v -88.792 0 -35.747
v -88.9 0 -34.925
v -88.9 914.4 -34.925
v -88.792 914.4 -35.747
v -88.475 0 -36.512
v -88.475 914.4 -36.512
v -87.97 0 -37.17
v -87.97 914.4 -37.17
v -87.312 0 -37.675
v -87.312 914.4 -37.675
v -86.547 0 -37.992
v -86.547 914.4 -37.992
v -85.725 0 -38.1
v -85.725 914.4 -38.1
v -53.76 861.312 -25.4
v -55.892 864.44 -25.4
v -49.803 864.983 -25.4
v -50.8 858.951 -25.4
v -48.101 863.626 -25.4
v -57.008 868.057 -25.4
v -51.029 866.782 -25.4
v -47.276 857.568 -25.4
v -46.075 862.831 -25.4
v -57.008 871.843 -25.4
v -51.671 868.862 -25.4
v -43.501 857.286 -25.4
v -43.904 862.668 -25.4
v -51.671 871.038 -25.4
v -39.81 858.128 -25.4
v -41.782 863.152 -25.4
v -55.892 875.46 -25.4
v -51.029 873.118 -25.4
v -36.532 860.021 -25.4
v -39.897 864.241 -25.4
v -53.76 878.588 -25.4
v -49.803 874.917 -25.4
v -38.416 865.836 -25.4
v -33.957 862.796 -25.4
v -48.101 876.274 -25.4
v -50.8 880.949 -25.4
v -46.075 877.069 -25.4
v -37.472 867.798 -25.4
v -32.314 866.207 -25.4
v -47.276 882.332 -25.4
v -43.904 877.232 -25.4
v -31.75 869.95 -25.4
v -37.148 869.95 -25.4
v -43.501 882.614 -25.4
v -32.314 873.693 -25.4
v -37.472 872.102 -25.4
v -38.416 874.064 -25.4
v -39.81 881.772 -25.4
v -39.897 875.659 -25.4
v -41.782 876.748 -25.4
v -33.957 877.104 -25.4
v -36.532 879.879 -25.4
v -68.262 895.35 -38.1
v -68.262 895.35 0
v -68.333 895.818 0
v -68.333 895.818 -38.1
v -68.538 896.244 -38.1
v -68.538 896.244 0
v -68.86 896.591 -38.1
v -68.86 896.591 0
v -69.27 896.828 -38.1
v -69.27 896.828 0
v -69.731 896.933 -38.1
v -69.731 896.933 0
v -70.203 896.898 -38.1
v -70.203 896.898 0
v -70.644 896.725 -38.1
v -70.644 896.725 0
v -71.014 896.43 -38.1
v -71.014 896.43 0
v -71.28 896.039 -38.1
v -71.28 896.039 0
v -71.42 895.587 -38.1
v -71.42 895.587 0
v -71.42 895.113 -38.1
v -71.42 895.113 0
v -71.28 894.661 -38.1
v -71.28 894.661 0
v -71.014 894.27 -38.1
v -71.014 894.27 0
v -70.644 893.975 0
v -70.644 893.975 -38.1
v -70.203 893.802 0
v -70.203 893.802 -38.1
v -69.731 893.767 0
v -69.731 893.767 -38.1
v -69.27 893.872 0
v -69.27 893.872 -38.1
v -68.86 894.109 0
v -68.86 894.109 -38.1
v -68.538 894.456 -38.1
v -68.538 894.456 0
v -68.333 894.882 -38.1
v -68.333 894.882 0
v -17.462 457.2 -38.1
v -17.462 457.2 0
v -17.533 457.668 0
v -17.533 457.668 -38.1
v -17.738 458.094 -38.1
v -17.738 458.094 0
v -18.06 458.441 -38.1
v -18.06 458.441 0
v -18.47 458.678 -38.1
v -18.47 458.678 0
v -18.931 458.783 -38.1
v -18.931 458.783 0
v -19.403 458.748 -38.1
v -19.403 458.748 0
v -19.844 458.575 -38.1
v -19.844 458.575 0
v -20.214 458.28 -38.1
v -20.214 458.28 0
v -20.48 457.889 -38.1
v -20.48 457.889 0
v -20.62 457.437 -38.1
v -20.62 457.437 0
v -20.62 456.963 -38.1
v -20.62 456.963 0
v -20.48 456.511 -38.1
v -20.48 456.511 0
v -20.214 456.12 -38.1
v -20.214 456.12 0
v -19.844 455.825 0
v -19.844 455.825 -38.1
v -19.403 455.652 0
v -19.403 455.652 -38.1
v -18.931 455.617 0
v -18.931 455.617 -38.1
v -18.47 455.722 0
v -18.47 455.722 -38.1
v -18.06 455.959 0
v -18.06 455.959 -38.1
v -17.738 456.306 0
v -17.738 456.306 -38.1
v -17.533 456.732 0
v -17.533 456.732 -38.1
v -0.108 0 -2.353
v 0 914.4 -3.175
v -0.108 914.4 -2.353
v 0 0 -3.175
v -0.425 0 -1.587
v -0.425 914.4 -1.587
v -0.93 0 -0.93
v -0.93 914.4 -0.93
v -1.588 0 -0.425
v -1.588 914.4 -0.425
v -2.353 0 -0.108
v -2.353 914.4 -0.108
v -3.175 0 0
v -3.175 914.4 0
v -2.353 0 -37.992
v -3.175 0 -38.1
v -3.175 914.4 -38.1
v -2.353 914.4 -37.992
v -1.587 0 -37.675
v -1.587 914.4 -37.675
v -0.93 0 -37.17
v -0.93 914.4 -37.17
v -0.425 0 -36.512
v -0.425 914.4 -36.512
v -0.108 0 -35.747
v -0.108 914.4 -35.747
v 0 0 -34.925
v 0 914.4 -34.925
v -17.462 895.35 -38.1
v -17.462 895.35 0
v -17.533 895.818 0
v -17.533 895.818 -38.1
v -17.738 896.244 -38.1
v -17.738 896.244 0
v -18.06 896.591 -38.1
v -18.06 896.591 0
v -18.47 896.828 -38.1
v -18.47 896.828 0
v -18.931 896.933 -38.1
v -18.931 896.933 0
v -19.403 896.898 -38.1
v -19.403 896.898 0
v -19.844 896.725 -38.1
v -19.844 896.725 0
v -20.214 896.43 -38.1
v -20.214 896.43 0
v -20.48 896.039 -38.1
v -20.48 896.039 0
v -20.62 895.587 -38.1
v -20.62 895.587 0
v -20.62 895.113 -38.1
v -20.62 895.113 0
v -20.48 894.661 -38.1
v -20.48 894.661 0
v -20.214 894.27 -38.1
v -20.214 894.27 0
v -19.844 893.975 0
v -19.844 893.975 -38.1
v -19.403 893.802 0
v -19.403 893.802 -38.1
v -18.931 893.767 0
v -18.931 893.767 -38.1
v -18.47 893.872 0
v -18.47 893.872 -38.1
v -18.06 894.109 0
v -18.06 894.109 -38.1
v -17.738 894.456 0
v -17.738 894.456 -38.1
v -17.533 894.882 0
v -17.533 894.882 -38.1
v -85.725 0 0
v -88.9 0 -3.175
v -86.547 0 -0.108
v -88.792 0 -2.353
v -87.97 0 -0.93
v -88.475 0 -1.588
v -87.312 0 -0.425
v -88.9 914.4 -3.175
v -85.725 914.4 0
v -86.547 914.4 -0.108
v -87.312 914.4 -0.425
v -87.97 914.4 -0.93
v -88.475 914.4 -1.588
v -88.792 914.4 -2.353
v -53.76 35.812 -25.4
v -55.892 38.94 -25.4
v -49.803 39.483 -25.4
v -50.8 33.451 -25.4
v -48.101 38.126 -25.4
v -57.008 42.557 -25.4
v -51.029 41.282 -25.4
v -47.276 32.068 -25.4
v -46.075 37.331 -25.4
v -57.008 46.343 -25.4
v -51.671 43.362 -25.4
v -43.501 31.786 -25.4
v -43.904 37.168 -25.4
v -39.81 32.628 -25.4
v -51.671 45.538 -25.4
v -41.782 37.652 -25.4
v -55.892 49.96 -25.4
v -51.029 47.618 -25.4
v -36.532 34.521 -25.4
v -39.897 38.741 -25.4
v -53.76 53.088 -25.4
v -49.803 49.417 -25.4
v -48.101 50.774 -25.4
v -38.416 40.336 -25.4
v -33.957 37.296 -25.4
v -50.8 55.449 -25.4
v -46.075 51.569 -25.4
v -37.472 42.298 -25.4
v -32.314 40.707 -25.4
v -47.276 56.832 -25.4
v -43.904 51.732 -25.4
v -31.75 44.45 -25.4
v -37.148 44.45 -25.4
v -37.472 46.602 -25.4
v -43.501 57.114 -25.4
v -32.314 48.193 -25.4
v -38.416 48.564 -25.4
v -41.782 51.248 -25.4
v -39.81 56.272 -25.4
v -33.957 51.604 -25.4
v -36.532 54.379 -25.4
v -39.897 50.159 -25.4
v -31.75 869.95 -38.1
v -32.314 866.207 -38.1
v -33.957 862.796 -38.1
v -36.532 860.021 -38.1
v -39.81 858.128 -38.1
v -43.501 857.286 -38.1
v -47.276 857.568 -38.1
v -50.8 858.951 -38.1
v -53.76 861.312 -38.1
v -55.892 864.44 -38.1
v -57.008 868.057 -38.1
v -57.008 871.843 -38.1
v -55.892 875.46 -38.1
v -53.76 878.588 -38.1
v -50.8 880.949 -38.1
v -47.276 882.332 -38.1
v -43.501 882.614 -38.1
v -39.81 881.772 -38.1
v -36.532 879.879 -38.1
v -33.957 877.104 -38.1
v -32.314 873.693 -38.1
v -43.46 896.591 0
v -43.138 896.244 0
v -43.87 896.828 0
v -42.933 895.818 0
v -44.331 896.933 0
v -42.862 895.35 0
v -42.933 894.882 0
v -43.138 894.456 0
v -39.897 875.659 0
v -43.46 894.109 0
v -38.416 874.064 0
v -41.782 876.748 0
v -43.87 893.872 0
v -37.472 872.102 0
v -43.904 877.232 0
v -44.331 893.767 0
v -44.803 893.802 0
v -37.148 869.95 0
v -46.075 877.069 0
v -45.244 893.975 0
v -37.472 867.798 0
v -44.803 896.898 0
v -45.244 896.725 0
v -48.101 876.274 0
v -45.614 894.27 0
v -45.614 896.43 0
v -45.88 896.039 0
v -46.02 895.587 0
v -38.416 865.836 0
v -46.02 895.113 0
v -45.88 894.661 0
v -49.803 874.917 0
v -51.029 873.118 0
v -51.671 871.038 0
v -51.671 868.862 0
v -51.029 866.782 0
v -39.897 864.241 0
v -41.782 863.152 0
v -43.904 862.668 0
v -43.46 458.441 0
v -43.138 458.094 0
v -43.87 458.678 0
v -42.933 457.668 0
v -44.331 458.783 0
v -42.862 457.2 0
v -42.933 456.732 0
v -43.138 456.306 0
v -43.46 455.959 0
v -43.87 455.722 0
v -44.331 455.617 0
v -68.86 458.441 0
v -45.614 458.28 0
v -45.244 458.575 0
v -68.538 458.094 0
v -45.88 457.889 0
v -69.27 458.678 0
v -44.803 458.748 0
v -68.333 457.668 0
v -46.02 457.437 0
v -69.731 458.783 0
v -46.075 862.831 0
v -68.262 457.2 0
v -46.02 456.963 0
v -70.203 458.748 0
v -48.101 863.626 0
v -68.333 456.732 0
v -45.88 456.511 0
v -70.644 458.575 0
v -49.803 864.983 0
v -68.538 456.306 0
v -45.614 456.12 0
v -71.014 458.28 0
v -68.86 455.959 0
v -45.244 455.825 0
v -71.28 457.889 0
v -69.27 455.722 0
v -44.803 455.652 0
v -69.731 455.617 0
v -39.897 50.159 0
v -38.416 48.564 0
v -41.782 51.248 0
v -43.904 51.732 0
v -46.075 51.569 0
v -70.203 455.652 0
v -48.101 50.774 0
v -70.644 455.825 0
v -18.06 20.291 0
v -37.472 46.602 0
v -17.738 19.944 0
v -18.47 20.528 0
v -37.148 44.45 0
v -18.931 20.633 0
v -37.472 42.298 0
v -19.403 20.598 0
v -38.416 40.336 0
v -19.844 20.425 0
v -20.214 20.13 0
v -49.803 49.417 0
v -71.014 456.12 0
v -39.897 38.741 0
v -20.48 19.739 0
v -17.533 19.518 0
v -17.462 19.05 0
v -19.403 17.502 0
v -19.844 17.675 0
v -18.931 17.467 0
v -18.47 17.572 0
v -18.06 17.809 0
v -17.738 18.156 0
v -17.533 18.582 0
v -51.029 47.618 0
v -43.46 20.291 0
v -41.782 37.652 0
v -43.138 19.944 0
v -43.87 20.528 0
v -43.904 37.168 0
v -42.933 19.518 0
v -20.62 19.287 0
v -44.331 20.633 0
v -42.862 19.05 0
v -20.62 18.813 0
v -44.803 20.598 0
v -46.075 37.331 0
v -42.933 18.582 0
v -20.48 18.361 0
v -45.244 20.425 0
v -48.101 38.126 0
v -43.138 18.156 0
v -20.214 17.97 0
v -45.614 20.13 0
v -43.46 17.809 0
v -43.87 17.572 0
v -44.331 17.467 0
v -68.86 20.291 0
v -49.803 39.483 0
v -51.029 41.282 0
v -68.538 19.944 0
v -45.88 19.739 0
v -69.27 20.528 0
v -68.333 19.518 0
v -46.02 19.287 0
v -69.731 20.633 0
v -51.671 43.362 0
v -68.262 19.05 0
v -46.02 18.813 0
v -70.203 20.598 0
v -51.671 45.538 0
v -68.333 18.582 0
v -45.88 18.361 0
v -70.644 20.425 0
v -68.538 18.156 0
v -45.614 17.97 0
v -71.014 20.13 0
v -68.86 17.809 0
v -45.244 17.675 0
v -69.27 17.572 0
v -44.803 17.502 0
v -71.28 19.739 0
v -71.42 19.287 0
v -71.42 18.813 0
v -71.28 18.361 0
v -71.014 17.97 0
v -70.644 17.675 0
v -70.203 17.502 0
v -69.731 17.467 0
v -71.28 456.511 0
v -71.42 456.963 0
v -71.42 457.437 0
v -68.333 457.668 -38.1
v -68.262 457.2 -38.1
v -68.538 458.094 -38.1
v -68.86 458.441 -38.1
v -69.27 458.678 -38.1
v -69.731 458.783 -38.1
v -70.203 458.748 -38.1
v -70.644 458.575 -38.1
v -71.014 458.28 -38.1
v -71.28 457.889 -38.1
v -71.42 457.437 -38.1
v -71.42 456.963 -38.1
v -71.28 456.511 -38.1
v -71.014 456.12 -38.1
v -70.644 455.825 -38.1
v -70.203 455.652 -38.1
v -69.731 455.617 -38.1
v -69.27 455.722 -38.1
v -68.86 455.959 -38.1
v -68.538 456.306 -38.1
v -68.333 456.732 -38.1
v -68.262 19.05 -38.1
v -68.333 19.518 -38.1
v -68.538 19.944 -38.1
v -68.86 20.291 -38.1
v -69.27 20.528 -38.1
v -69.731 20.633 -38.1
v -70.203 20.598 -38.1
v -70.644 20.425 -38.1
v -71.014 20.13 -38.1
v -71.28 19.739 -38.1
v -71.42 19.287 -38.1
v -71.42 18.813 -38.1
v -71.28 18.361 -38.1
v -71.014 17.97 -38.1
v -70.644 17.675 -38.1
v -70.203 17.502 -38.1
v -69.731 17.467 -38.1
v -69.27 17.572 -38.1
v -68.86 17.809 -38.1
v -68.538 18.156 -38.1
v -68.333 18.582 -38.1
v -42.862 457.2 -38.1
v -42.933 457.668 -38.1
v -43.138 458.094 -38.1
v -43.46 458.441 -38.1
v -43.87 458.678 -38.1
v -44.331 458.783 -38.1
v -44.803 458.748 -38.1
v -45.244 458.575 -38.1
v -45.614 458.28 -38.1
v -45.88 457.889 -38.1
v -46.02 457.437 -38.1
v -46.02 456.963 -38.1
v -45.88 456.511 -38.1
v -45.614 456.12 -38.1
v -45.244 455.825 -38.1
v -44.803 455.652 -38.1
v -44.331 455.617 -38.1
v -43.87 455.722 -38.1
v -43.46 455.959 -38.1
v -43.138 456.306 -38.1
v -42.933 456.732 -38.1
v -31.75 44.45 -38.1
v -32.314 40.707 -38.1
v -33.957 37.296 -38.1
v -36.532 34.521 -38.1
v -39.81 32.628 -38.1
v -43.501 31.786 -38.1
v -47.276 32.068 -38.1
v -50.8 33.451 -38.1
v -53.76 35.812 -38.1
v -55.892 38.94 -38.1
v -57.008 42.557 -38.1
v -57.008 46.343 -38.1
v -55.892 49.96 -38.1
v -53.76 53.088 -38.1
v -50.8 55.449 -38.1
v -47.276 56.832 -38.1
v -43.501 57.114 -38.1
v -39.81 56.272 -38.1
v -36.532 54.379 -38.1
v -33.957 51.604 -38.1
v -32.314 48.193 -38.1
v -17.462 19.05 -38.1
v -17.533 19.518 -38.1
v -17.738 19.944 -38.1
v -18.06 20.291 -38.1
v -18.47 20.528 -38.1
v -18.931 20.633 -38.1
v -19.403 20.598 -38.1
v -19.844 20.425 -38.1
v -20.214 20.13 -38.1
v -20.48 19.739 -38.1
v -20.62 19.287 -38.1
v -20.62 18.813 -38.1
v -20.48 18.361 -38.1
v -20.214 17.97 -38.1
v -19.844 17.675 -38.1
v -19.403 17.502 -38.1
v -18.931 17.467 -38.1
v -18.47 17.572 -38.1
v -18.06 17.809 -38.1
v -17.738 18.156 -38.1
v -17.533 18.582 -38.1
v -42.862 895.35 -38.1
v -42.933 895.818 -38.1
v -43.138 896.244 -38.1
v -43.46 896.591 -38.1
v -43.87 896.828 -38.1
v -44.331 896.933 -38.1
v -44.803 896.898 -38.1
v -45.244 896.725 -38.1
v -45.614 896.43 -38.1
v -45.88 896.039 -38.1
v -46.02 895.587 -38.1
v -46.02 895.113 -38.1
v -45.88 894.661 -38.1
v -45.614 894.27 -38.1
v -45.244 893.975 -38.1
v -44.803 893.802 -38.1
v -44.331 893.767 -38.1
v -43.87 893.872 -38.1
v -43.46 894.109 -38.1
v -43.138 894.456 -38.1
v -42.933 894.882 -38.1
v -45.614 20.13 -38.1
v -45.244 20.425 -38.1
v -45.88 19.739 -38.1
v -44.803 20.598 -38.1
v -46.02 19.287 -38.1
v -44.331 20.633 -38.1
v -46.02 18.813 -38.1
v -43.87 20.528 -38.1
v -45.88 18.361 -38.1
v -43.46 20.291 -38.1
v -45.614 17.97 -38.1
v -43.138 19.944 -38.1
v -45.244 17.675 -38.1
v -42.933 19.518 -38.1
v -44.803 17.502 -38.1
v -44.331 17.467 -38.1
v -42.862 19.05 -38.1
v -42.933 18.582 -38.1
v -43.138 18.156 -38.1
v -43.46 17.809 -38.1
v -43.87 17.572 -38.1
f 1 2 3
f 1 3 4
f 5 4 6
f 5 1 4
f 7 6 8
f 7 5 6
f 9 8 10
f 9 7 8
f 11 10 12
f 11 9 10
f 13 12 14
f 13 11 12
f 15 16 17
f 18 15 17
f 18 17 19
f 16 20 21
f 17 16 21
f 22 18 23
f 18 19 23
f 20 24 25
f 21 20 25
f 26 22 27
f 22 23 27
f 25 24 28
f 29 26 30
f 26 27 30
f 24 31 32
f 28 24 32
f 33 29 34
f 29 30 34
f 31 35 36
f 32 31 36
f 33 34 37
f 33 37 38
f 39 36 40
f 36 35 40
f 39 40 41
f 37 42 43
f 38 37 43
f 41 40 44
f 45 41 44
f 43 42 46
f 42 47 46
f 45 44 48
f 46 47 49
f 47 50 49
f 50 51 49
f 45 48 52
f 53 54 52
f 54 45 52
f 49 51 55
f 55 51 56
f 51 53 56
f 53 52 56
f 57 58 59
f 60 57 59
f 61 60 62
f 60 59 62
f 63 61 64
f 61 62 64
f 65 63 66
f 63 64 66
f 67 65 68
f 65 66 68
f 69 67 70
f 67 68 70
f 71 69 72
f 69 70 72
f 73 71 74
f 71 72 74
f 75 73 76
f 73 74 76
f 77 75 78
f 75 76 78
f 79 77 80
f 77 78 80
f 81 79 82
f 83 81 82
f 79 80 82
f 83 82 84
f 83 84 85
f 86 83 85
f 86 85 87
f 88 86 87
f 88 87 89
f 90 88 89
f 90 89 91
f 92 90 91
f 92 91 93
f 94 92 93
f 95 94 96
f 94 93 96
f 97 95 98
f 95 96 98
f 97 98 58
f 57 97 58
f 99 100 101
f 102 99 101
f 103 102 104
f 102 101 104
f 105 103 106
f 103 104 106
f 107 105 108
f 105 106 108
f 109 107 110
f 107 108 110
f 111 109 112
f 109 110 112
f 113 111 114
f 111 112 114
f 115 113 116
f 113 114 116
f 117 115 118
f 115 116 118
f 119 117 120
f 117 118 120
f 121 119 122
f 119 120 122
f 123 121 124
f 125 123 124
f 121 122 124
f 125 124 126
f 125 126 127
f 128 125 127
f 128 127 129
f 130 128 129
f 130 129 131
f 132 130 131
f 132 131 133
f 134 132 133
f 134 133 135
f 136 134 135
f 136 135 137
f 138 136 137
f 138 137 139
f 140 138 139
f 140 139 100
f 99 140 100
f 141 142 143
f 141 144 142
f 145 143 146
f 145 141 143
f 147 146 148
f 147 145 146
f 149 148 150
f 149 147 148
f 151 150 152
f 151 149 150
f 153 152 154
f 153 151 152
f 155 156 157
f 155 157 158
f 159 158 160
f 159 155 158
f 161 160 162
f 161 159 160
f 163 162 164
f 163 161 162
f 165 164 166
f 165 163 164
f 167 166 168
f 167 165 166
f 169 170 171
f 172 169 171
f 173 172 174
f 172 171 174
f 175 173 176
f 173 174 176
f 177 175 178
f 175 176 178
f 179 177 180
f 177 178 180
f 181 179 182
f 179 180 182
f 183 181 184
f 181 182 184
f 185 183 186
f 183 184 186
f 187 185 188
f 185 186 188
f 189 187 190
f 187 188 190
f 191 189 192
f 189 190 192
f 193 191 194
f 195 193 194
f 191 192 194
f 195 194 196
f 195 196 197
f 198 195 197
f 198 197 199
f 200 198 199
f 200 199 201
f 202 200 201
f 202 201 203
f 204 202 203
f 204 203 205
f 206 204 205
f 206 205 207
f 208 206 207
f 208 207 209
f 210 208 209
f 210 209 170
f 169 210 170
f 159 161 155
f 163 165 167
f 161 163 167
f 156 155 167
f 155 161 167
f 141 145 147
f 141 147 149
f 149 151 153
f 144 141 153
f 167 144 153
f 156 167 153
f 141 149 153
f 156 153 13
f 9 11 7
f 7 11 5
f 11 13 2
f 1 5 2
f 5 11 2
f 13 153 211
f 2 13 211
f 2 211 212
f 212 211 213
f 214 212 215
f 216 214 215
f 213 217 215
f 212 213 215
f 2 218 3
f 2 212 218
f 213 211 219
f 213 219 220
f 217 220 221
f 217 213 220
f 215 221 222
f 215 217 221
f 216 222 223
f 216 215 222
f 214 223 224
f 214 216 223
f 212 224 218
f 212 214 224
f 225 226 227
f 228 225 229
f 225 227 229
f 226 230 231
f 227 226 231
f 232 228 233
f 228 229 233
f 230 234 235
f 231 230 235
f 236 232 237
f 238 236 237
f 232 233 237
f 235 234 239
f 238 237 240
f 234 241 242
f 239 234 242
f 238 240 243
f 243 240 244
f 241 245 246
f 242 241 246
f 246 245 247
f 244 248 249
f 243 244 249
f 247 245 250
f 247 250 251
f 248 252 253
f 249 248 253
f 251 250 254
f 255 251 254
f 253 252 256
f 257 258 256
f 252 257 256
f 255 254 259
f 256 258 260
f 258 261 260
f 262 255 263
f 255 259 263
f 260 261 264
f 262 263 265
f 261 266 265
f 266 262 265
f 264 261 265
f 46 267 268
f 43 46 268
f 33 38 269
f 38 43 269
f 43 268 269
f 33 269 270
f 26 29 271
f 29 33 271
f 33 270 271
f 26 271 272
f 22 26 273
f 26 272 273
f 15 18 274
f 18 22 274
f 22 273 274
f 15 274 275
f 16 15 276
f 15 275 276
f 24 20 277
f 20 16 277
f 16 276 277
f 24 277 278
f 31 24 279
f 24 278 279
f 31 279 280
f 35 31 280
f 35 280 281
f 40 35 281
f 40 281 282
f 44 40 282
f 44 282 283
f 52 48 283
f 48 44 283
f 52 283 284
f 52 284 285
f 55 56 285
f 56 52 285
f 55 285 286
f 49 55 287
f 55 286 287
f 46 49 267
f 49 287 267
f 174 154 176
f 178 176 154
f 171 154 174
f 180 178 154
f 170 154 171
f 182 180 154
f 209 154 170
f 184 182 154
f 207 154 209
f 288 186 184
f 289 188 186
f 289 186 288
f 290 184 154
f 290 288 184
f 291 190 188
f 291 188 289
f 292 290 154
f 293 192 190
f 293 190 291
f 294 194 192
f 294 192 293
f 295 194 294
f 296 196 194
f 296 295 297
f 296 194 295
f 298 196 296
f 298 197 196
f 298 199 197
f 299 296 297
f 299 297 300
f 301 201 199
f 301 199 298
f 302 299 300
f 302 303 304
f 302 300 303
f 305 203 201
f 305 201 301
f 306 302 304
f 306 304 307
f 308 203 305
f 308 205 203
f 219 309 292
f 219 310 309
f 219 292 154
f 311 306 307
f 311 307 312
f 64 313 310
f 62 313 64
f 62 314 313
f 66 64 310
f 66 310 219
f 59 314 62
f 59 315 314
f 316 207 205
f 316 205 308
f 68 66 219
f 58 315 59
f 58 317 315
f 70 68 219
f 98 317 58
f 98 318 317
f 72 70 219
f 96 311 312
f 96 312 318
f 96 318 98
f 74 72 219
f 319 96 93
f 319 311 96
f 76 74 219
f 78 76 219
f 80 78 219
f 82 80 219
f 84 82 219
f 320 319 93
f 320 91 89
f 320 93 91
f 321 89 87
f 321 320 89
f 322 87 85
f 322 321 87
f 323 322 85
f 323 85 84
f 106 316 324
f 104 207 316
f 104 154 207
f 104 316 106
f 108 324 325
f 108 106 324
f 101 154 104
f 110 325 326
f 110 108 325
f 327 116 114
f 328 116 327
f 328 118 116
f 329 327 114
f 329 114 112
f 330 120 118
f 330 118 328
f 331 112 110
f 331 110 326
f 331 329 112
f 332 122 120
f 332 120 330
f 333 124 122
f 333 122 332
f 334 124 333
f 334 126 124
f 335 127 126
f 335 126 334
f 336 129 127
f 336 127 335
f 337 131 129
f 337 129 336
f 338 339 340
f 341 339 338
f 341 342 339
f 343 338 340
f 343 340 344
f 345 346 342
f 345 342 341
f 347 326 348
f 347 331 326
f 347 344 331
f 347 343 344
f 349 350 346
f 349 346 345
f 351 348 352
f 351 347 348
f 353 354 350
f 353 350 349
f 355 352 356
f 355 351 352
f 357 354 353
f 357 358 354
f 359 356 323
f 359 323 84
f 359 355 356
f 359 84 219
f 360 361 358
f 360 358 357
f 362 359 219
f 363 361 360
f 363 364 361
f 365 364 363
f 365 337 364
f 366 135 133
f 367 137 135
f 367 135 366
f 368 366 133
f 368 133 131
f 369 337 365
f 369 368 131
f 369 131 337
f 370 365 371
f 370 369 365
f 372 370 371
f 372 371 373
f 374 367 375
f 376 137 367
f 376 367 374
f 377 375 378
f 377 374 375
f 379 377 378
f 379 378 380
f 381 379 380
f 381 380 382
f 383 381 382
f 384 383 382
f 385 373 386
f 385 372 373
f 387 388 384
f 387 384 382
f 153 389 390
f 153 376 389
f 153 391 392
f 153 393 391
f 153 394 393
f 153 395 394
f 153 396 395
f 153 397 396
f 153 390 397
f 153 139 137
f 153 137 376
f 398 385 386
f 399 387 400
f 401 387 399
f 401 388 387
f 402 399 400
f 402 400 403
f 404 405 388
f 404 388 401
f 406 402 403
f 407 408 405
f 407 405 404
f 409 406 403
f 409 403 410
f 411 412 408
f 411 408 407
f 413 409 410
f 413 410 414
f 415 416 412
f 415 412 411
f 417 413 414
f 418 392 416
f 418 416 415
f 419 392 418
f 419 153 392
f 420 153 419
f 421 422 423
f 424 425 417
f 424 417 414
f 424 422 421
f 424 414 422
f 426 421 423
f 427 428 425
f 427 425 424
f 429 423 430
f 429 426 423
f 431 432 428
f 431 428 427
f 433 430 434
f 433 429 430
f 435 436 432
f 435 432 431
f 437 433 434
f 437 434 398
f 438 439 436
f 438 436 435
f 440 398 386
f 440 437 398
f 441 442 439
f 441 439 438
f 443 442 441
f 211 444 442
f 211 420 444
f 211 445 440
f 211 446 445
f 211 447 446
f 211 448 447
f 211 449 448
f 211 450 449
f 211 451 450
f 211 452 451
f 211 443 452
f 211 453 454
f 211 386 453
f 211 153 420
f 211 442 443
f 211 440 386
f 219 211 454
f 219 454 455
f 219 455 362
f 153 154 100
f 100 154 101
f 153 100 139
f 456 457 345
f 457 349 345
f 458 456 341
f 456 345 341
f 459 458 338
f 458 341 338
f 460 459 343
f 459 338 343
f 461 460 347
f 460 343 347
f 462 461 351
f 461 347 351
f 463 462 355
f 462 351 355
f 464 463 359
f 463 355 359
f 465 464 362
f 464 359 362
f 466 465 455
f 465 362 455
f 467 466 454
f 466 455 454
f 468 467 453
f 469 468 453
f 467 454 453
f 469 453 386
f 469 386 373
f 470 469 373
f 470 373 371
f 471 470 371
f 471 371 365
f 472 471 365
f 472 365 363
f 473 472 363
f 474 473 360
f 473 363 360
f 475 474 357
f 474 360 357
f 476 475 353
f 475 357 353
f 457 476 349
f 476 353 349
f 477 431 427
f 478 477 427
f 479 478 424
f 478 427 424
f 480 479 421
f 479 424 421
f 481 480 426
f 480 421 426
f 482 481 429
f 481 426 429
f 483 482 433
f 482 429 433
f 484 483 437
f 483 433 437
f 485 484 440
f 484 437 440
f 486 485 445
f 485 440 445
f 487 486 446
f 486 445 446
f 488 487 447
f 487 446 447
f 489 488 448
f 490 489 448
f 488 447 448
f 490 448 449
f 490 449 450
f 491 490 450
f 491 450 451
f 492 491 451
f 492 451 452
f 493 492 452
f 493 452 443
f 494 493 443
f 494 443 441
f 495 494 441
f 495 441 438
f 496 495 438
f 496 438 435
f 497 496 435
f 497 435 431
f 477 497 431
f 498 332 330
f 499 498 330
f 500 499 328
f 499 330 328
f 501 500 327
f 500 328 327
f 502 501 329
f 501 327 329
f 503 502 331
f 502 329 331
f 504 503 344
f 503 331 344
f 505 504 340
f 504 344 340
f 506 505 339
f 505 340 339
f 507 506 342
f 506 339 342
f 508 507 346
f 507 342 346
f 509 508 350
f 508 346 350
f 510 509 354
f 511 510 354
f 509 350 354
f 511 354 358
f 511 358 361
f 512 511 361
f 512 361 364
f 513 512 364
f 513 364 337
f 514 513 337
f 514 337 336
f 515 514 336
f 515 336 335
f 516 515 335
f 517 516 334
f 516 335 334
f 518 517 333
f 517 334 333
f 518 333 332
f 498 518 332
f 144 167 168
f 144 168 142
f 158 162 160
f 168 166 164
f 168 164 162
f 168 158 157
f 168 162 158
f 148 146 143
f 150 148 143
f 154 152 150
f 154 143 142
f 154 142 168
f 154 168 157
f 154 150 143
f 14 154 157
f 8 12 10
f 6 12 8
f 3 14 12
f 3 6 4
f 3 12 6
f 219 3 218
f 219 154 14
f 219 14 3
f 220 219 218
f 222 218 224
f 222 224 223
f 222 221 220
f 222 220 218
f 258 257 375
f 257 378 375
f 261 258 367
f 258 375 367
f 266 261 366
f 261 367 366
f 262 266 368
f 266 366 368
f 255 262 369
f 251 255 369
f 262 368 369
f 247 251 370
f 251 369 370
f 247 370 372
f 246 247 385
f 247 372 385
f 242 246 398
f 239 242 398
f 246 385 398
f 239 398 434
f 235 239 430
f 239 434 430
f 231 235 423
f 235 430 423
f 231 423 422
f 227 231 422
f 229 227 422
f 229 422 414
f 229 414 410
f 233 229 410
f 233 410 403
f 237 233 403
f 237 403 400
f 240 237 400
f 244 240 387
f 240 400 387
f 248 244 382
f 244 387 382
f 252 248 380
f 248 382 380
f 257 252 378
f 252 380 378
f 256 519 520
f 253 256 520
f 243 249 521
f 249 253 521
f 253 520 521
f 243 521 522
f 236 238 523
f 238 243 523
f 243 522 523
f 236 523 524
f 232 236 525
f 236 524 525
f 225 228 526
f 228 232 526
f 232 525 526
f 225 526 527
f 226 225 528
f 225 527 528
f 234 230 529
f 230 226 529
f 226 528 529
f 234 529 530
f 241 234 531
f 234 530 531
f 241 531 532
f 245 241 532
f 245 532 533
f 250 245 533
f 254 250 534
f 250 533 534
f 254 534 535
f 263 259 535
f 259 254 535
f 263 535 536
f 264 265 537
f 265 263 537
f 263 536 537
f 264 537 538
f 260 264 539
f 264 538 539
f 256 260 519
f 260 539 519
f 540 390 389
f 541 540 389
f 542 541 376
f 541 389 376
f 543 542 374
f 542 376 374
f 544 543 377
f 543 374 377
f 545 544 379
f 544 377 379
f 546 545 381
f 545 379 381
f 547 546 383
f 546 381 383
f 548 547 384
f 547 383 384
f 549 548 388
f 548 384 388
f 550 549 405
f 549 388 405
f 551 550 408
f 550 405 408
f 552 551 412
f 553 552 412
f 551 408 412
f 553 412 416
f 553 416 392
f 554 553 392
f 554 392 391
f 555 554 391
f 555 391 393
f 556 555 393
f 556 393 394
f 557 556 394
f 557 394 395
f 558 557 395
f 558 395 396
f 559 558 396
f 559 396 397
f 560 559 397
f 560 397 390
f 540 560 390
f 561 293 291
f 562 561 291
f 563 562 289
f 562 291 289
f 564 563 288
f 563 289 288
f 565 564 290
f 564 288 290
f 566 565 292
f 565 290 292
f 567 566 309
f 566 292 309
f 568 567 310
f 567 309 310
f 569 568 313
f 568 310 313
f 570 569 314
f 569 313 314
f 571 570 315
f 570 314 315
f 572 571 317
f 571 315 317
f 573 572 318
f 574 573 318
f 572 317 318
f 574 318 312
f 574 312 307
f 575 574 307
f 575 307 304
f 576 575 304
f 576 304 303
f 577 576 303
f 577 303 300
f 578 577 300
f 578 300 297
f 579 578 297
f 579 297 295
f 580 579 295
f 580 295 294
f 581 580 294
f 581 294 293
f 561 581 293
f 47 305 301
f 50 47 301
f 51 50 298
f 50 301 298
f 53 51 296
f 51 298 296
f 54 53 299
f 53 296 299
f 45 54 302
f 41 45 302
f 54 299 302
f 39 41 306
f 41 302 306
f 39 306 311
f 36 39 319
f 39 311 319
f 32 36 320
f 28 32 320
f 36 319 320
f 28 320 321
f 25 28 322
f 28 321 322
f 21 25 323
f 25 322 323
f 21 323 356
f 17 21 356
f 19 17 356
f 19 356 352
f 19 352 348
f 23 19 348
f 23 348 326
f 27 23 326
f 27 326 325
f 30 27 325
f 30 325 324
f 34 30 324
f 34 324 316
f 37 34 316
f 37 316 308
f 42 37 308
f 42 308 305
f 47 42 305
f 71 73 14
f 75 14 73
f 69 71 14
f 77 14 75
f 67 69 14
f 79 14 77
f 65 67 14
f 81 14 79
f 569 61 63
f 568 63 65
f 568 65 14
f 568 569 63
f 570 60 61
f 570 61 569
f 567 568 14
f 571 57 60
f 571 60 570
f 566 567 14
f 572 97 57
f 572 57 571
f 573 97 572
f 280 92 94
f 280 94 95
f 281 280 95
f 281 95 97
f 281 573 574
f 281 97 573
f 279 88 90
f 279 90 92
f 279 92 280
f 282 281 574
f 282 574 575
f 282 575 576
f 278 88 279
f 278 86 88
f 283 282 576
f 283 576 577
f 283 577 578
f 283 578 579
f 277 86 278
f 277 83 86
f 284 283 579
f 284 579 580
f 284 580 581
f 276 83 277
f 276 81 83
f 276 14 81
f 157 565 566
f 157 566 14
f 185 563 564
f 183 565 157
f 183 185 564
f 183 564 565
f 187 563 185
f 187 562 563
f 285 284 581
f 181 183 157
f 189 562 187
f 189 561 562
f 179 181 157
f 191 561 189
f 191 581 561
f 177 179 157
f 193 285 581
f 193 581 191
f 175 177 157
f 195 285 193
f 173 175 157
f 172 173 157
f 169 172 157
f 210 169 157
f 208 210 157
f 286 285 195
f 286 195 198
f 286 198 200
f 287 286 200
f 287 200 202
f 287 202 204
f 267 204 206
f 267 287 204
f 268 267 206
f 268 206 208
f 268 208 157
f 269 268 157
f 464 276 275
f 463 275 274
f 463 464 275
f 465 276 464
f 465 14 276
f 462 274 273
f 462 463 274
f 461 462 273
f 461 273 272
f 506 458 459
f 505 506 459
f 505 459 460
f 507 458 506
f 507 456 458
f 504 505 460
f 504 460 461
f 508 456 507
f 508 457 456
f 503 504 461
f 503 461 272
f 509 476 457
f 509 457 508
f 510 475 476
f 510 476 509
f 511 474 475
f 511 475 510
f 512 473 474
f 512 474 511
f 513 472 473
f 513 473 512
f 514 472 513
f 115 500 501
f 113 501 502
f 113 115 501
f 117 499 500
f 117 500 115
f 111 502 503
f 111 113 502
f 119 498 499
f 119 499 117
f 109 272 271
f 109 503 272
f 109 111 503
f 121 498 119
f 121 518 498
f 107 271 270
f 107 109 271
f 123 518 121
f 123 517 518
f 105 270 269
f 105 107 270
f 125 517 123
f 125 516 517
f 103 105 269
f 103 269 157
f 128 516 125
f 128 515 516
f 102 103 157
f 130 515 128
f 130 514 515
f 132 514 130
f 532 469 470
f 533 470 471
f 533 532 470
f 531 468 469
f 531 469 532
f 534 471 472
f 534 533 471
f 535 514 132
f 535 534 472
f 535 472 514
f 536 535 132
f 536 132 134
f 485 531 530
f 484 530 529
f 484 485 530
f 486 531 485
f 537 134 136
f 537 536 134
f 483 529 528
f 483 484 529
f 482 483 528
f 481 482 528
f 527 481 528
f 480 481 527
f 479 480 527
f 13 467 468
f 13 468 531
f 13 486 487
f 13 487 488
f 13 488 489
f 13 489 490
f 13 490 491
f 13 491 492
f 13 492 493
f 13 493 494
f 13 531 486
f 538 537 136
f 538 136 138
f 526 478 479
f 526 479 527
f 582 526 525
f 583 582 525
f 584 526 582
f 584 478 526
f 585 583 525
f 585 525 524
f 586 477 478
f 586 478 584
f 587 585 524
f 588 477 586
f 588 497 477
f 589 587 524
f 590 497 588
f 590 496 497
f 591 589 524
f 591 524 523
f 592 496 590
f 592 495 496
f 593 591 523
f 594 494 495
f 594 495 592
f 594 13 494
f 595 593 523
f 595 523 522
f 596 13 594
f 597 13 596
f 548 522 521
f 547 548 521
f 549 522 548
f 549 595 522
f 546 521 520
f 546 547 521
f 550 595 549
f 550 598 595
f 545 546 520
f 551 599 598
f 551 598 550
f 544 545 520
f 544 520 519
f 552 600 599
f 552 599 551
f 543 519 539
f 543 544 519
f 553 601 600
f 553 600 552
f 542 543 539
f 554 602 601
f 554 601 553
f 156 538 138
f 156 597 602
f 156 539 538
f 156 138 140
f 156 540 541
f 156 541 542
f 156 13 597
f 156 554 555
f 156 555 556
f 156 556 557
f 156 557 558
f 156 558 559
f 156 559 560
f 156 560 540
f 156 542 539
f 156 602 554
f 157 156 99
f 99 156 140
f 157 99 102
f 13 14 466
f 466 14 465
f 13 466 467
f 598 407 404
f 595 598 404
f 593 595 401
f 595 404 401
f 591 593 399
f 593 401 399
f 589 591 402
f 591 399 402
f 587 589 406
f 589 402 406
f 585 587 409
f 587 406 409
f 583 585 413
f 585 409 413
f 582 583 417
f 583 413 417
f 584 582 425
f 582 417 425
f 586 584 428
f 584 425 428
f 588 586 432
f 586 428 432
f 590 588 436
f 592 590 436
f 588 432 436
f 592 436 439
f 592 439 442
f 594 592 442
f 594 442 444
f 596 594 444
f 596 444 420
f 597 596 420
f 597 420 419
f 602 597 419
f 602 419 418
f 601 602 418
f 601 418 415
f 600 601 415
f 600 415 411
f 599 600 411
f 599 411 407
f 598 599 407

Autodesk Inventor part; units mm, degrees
ref_plane "YZ Plane" through (0, 0, 0) normal (1, 0, 0) x (0, 1, 0)
ref_plane "XZ Plane" through (0, 0, 0) normal (0, 1, 0) x (-1, 0, 0)
ref_plane "XY Plane" through (0, 0, 0) normal (0, 0, 1) x (1, 0, 0)
sketch "Sketch1" plane through (0, 0, 0) normal (0, 1, 0) x (-1, 0, 0)
  line L0 (3.175, 0) -> (85.725, 0)
  line L1 (88.9, -3.175) -> (88.9, -34.925)
  line L2 (85.725, -38.1) -> (3.175, -38.1)
  line L3 (0, -34.925) -> (0, -3.175)
  arc A0 (88.9, -3.175) -> (85.725, 0) centre (85.725, -3.175) ccw
  arc A1 (85.725, -38.1) -> (88.9, -34.925) centre (85.725, -34.925) ccw
  arc A2 (0, -34.925) -> (3.175, -38.1) centre (3.175, -34.925) ccw
  arc A3 (3.175, 0) -> (0, -3.175) centre (3.175, -3.175) ccw
  point P0 (0, 0)
  point P1 (88.9, -38.1)
  point P2 (88.9, 0)
  point P3 (0, -38.1)
  dimension "d0" = 88.9
  dimension "d1" = 38.1
  dimension "d2" = 3.175
extrude "Extrusion1" add sketch "Sketch1" along normal blind 914.4
sketch "Sketch2" plane through (-85.725, 0, 0) normal (0, 0, 1) x (1, 0, 0)
  line L0 (0, 0) -> (82.55, 0) construction
  line L1 (82.55, 0) -> (82.55, 914.4) construction
  line L2 (0, 914.4) -> (82.55, 914.4) construction
  line L3 (0, 0) -> (0, 914.4) construction
  line L4 (-3.175, 0) -> (-3.175, 914.4) construction
  line L5 (85.725, 0) -> (85.725, 914.4) construction
  circle A0 centre (41.275, 44.45) radius 7.3025
  line L6 (41.275, 0) -> (41.275, 44.45) construction
  line L7 (41.275, 44.45) -> (-3.175, 44.45) construction
  line L8 (-3.175, 0) -> (-3.175, 914.4) construction
  line L9 (-3.175, 457.2) -> (85.725, 457.2) construction
  circle A1 centre (41.275, 869.95) radius 7.3025
  dimension "d5" = 14.605
extrude "Extrusion2" cut sketch "Sketch2" against normal through all
sketch "Sketch3" plane through (-85.725, 0, -38.1) normal (0, 0, 1) x (1, 0, 0)
  circle A0 centre (41.275, 44.45) radius 7.3025 projected
  circle A1 centre (41.275, 44.45) radius 12.7
  line L0 (0, 0) -> (0, 914.4) construction
  line L1 (0, 457.2) -> (82.55, 457.2) construction
  line L2 (82.55, 0) -> (82.55, 914.4) construction
  circle A2 centre (41.275, 869.95) radius 12.7
  point P0 (85.725, 0)
  dimension "d8" = 25.4
extrude "Extrusion3" cut sketch "Sketch3" along normal blind 12.7 contours A0 | A1 | A2
sketch "Sketch4" plane through (-85.725, 0, 0) normal (0, 0, 1) x (1, 0, 0)
  line L0 (85.725, 0) -> (-3.175, 0) construction
  line L1 (-3.175, 0) -> (-3.175, 38.1) construction
  line L2 (-3.175, 38.1) -> (85.725, 38.1) construction
  line L3 (85.725, 38.1) -> (85.725, 0) construction
  circle A0 centre (66.675, 19.05) radius 19.05 construction
  line L4 (0, 0) -> (82.55, 0) projected
  circle A1 centre (15.875, 19.05) radius 19.05 construction
  circle A2 centre (66.675, 19.05) radius 1.5875
  circle A3 centre (15.875, 19.05) radius 1.5875
  circle A4 centre (41.275, 19.05) radius 1.5875
  line L5 (0, 0) -> (0, 914.4) projected
  line L6 (0, 457.2) -> (82.55, 457.2) construction
  line L7 (82.55, 0) -> (82.55, 914.4) projected
  line L8 (85.725, 438.15) -> (-3.175, 438.15) construction
  line L9 (-3.175, 438.15) -> (-3.175, 476.25) construction
  line L10 (-3.175, 476.25) -> (85.725, 476.25) construction
  line L11 (85.725, 476.25) -> (85.725, 438.15) construction
  circle A5 centre (66.675, 457.2) radius 19.05 construction
  circle A6 centre (15.875, 457.2) radius 19.05 construction
  circle A7 centre (66.675, 457.2) radius 1.5875
  circle A8 centre (15.875, 457.2) radius 1.5875
  circle A9 centre (41.275, 457.2) radius 1.5875
  circle A10 centre (66.675, 895.35) radius 1.5875
  circle A11 centre (15.875, 895.35) radius 1.5875
  circle A12 centre (41.275, 895.35) radius 1.5875
  point P0 (41.275, 0)
  point P1 (41.275, 438.15)
  point P2 (41.275, 457.2)
  dimension "d11" = 88.9
  dimension "d12" = 38.1
  dimension "d13" = 3.175
  dimension "d14" = 88.9
  dimension "d15" = 38.1
  dimension "d16" = 3.175
extrude "Extrusion4" cut sketch "Sketch4" against normal through all
properties part number "Horizontal Beam 3ft" material "Wood (Birch)"
